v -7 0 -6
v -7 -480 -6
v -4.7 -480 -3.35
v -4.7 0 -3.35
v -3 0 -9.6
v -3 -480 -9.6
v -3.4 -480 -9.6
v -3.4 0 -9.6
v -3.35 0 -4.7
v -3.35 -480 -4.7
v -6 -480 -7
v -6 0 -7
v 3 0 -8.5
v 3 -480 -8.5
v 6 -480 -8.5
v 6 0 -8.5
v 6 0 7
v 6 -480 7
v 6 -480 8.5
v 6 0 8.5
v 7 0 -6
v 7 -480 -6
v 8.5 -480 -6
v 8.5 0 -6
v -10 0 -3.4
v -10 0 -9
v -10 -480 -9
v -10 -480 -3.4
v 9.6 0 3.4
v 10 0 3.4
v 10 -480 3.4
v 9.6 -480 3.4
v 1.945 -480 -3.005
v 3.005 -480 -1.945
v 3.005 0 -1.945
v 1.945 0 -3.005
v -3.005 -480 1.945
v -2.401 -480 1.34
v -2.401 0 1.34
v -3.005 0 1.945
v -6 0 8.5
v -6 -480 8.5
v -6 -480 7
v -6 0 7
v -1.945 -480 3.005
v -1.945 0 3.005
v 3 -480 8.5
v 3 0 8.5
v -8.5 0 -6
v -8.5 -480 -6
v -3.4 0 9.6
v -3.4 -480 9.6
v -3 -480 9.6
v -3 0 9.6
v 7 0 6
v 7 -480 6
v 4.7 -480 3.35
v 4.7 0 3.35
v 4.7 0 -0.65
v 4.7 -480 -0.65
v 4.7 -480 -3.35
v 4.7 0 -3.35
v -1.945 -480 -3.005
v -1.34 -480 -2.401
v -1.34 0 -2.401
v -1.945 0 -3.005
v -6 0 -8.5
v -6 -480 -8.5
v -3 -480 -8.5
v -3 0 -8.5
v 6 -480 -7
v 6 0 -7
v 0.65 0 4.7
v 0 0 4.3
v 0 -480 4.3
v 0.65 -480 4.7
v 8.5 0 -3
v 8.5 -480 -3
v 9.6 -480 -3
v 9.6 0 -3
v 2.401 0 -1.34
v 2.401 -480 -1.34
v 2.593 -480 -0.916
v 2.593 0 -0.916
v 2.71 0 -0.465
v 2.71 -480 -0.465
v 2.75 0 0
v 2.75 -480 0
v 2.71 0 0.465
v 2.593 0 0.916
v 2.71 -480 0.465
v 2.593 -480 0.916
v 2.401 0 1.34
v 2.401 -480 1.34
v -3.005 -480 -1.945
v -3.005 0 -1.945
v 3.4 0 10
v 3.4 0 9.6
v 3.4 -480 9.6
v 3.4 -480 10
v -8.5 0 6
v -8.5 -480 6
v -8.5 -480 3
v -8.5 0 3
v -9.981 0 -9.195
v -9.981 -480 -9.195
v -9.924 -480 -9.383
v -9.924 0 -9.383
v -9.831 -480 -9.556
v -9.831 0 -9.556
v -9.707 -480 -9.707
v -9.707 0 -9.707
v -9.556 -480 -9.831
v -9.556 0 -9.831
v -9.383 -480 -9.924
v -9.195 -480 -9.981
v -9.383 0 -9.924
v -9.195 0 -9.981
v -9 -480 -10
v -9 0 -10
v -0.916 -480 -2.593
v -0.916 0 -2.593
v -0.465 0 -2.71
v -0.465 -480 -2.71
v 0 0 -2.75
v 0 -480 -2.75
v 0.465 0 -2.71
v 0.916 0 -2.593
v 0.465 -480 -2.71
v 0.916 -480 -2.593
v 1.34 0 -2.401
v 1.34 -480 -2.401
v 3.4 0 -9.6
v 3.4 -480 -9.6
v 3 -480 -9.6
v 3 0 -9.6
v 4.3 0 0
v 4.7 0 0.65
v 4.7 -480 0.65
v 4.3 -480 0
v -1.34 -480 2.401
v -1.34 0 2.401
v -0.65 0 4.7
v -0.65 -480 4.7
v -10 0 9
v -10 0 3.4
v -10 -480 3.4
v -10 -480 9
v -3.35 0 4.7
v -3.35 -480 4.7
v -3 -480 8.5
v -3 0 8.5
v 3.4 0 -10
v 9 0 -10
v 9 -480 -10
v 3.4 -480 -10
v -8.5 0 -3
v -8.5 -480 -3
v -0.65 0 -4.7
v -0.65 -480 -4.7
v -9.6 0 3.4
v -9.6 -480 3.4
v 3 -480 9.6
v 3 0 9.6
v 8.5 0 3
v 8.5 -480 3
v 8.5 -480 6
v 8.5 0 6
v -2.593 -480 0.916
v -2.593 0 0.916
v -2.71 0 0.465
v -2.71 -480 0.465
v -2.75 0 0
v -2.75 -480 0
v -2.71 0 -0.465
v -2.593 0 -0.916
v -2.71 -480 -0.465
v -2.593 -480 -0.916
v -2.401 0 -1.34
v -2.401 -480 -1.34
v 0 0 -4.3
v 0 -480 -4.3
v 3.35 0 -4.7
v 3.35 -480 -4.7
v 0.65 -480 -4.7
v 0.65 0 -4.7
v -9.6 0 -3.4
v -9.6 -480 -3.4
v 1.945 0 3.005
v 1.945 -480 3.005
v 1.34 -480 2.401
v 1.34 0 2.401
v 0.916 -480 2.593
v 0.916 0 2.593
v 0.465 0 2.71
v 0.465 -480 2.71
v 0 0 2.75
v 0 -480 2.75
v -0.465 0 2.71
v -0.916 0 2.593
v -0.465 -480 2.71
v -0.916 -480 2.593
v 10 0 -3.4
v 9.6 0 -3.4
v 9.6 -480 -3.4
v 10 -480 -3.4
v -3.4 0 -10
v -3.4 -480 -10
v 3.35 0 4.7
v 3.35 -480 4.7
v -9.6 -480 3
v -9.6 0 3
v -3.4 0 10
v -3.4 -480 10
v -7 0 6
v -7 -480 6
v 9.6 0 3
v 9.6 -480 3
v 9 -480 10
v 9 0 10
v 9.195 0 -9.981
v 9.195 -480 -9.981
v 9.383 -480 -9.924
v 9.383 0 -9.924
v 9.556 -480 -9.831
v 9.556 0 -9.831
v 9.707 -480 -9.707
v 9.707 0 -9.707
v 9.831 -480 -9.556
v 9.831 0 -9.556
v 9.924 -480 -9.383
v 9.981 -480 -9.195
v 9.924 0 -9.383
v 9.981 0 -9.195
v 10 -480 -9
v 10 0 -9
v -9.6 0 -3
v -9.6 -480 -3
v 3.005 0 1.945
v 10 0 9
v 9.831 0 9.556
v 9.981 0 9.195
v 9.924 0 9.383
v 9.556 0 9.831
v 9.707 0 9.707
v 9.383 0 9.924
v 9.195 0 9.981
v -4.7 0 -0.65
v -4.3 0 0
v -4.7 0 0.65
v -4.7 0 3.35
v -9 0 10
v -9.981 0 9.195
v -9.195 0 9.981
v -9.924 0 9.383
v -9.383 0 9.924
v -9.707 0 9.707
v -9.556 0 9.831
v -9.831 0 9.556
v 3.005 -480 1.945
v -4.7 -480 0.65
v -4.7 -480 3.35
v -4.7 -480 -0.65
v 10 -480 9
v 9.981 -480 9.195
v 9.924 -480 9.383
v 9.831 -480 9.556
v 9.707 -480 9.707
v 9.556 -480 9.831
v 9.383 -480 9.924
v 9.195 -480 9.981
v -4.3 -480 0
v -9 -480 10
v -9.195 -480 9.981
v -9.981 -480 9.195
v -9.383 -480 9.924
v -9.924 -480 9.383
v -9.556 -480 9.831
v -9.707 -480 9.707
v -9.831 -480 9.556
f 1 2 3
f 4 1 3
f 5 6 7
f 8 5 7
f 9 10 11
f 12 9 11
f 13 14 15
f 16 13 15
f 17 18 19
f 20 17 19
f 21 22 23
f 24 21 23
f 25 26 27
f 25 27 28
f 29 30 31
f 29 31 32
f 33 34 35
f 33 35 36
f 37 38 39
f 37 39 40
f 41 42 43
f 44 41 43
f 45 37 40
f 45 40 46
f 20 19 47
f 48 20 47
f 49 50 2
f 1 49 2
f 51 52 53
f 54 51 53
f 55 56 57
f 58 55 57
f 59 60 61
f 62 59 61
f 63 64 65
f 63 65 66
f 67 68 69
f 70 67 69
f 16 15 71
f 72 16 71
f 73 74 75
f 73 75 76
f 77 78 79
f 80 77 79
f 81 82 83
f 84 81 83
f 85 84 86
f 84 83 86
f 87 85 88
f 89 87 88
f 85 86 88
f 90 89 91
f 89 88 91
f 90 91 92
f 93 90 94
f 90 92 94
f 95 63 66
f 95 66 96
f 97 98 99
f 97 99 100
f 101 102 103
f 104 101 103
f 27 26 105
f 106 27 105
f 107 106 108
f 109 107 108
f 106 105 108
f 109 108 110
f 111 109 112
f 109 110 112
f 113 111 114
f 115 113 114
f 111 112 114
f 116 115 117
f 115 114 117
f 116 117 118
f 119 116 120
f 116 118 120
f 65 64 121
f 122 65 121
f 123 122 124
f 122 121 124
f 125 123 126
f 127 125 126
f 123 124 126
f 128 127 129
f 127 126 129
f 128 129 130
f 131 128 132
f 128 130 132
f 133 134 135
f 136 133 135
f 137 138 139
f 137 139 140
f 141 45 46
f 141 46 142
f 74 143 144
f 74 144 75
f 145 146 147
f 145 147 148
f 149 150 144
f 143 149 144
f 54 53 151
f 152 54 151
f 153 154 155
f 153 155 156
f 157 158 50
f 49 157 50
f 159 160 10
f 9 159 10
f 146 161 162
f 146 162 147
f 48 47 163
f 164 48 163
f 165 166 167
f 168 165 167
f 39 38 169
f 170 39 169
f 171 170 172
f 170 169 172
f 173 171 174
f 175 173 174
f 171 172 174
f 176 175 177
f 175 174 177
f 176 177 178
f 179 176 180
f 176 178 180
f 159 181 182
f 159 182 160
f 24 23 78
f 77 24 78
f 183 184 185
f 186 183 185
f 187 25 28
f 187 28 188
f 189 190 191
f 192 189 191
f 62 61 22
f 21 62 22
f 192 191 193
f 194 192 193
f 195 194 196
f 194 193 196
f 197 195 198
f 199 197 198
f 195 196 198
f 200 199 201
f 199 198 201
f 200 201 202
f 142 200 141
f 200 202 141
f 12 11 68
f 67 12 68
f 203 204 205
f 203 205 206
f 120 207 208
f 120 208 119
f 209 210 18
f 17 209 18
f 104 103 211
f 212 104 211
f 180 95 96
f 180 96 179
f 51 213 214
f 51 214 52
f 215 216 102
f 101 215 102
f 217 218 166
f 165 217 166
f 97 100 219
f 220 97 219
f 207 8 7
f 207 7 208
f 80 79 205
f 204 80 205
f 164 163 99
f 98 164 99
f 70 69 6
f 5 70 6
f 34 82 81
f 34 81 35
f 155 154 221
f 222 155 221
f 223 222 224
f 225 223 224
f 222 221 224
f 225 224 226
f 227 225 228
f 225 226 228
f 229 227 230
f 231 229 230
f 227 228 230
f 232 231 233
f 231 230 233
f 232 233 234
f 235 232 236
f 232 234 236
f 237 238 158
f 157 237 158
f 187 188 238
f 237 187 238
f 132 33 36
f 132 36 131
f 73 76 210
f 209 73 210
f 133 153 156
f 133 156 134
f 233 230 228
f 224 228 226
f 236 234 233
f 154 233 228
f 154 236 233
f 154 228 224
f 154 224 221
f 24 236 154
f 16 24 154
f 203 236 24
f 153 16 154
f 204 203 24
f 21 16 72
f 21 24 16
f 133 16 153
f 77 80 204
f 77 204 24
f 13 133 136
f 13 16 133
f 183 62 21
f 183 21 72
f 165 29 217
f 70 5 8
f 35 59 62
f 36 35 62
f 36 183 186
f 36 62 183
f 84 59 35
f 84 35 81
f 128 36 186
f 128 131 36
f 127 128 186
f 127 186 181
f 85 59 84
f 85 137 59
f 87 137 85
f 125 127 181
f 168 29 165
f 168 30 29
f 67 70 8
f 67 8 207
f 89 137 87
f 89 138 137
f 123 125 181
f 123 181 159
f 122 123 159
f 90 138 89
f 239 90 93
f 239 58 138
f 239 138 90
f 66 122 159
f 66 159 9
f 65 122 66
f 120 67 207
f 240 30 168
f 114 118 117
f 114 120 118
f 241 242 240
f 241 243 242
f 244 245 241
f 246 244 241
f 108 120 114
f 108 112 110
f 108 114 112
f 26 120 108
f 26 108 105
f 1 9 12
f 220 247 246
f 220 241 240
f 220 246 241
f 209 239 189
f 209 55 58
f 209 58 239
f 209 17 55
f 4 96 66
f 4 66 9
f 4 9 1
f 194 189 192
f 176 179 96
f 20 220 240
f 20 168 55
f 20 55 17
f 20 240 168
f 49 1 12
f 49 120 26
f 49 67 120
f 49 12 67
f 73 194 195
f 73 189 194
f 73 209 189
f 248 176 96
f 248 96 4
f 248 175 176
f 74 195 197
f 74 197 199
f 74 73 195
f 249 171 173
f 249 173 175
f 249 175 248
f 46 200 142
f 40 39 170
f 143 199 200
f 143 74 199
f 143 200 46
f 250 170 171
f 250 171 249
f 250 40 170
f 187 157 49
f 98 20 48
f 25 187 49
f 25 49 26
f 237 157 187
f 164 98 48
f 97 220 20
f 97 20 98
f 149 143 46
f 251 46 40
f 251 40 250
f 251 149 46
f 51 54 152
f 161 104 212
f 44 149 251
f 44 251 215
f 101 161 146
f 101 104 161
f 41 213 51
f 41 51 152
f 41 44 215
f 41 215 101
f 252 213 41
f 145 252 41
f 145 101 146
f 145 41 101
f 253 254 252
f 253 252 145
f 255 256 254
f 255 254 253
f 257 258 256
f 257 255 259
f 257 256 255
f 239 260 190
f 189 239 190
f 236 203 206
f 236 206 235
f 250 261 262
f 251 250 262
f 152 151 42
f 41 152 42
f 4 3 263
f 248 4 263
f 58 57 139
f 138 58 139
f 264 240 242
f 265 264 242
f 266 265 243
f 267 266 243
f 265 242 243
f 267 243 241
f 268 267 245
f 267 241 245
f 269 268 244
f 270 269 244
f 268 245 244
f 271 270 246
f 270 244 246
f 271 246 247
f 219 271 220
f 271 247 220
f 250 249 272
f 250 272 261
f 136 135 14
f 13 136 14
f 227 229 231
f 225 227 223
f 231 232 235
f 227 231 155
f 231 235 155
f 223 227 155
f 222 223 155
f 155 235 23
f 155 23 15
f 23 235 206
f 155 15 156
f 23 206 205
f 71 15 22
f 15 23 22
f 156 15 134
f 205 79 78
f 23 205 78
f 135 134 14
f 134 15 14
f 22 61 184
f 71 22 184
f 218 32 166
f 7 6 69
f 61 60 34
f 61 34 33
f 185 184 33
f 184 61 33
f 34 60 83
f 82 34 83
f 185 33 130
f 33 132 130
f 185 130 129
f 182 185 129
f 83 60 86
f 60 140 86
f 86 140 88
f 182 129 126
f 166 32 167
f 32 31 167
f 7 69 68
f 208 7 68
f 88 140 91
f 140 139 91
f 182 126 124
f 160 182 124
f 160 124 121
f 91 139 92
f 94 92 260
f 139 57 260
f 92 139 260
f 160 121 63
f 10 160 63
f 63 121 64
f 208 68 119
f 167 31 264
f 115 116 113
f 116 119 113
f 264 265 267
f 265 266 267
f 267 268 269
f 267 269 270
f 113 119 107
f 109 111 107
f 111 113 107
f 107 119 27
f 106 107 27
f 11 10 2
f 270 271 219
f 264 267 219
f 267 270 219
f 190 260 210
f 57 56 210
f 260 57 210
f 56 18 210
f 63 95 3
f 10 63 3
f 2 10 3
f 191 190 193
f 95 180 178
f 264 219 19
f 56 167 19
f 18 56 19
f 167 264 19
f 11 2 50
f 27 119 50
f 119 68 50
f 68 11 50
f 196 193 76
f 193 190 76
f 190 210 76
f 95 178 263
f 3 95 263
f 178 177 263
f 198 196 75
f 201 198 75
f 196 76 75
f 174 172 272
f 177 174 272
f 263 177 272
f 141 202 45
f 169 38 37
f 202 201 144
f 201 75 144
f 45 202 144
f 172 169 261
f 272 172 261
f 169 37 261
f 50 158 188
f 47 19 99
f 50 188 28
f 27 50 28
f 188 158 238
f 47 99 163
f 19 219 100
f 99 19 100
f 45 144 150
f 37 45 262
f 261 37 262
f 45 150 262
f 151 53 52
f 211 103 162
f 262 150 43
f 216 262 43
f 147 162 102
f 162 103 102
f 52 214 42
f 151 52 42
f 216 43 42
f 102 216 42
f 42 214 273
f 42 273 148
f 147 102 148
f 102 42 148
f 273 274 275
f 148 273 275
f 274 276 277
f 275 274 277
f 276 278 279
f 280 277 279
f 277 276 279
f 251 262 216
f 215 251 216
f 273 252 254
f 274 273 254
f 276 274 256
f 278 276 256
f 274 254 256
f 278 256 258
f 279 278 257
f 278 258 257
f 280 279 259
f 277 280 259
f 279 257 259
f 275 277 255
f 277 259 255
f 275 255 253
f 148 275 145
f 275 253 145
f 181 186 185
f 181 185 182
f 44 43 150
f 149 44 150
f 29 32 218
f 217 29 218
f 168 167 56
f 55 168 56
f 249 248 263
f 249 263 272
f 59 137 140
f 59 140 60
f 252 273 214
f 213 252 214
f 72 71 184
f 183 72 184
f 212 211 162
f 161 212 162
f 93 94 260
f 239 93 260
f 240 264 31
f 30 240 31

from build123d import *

# Parameters (mm, degrees)
PAD_DEPTH          = 480
POCKET_DEPTH       = 480
POLARPATTERN_COUNT = 4
POCKET001_DEPTH    = 480


with BuildPart() as part:
    # Sketch → Pad (new body)
    with BuildSketch(Plane.XZ):
        with BuildLine():
            Line((-9, 10), (9, 10))
            ThreePointArc((10, 9), (9.707107, 9.707107), (9, 10))
            Line((10, 9), (10, -9))
            ThreePointArc((9, -10), (9.707107, -9.707107), (10, -9))
            Line((9, -10), (-9, -10))
            ThreePointArc((-10, -9), (-9.707107, -9.707107), (-9, -10))
            Line((-10, -9), (-10, 9))
            ThreePointArc((-9, 10), (-9.707107, 9.707107), (-10, 9))
        make_face()
    extrude(amount=PAD_DEPTH)

    # Sketch001 (on Face10 of Pad) → Pocket (cut)
    with BuildSketch(Plane.XZ.offset(480)):
        Polygon((-3.4, 10), (-3.4, 9.6), (-3, 9.6), (-3, 8.5), (-6, 8.5), (-6, 7), (-3.35, 4.7), (-0.65, 4.7), (0, 4.3), (0.65, 4.7), (3.35, 4.7), (6, 7), (6, 8.5), (3, 8.5), (3, 9.6), (3.4, 9.6), (3.4, 10), align=None)
    pocket = extrude(amount=-POCKET_DEPTH, mode=Mode.SUBTRACT)

    # PolarPattern: Pocket ×4 about axis
    polarpattern_axis = Axis((0, -480, 0), (0, -1, 0))
    for i in range(1, POLARPATTERN_COUNT):
        add(pocket.rotate(polarpattern_axis, i * 360 / POLARPATTERN_COUNT), mode=Mode.SUBTRACT)

    # Sketch002 (on Face4 of PolarPattern) → Pocket001 (cut)
    with BuildSketch(Plane.XZ.offset(480)):
        with BuildLine():
            ThreePointArc((1.340499, 2.401159), (0, 2.75), (-1.340499, 2.401159))
            Line((-1.944544, 3.005204), (-1.340499, 2.401159))
            Line((-3.005204, 1.944544), (-1.944544, 3.005204))
            Line((-2.401159, 1.340499), (-3.005204, 1.944544))
            ThreePointArc((-2.401159, 1.340499), (-2.75, 0), (-2.401159, -1.340499))
            Line((-3.005204, -1.944544), (-2.401159, -1.340499))
            Line((-1.944544, -3.005204), (-3.005204, -1.944544))
            Line((-1.340499, -2.401159), (-1.944544, -3.005204))
            ThreePointArc((-1.340499, -2.401159), (0, -2.75), (1.340499, -2.401159))
            Line((1.944544, -3.005204), (1.340499, -2.401159))
            Line((3.005204, -1.944544), (1.944544, -3.005204))
            Line((2.401159, -1.340499), (3.005204, -1.944544))
            ThreePointArc((2.401159, -1.340499), (2.75, 0), (2.401159, 1.340499))
            Line((2.401159, 1.340499), (3.005204, 1.944544))
            Line((3.005204, 1.944544), (1.944544, 3.005204))
            Line((1.944544, 3.005204), (1.340499, 2.401159))
        make_face()
    extrude(amount=-POCKET001_DEPTH, mode=Mode.SUBTRACT)


solid = part.part
